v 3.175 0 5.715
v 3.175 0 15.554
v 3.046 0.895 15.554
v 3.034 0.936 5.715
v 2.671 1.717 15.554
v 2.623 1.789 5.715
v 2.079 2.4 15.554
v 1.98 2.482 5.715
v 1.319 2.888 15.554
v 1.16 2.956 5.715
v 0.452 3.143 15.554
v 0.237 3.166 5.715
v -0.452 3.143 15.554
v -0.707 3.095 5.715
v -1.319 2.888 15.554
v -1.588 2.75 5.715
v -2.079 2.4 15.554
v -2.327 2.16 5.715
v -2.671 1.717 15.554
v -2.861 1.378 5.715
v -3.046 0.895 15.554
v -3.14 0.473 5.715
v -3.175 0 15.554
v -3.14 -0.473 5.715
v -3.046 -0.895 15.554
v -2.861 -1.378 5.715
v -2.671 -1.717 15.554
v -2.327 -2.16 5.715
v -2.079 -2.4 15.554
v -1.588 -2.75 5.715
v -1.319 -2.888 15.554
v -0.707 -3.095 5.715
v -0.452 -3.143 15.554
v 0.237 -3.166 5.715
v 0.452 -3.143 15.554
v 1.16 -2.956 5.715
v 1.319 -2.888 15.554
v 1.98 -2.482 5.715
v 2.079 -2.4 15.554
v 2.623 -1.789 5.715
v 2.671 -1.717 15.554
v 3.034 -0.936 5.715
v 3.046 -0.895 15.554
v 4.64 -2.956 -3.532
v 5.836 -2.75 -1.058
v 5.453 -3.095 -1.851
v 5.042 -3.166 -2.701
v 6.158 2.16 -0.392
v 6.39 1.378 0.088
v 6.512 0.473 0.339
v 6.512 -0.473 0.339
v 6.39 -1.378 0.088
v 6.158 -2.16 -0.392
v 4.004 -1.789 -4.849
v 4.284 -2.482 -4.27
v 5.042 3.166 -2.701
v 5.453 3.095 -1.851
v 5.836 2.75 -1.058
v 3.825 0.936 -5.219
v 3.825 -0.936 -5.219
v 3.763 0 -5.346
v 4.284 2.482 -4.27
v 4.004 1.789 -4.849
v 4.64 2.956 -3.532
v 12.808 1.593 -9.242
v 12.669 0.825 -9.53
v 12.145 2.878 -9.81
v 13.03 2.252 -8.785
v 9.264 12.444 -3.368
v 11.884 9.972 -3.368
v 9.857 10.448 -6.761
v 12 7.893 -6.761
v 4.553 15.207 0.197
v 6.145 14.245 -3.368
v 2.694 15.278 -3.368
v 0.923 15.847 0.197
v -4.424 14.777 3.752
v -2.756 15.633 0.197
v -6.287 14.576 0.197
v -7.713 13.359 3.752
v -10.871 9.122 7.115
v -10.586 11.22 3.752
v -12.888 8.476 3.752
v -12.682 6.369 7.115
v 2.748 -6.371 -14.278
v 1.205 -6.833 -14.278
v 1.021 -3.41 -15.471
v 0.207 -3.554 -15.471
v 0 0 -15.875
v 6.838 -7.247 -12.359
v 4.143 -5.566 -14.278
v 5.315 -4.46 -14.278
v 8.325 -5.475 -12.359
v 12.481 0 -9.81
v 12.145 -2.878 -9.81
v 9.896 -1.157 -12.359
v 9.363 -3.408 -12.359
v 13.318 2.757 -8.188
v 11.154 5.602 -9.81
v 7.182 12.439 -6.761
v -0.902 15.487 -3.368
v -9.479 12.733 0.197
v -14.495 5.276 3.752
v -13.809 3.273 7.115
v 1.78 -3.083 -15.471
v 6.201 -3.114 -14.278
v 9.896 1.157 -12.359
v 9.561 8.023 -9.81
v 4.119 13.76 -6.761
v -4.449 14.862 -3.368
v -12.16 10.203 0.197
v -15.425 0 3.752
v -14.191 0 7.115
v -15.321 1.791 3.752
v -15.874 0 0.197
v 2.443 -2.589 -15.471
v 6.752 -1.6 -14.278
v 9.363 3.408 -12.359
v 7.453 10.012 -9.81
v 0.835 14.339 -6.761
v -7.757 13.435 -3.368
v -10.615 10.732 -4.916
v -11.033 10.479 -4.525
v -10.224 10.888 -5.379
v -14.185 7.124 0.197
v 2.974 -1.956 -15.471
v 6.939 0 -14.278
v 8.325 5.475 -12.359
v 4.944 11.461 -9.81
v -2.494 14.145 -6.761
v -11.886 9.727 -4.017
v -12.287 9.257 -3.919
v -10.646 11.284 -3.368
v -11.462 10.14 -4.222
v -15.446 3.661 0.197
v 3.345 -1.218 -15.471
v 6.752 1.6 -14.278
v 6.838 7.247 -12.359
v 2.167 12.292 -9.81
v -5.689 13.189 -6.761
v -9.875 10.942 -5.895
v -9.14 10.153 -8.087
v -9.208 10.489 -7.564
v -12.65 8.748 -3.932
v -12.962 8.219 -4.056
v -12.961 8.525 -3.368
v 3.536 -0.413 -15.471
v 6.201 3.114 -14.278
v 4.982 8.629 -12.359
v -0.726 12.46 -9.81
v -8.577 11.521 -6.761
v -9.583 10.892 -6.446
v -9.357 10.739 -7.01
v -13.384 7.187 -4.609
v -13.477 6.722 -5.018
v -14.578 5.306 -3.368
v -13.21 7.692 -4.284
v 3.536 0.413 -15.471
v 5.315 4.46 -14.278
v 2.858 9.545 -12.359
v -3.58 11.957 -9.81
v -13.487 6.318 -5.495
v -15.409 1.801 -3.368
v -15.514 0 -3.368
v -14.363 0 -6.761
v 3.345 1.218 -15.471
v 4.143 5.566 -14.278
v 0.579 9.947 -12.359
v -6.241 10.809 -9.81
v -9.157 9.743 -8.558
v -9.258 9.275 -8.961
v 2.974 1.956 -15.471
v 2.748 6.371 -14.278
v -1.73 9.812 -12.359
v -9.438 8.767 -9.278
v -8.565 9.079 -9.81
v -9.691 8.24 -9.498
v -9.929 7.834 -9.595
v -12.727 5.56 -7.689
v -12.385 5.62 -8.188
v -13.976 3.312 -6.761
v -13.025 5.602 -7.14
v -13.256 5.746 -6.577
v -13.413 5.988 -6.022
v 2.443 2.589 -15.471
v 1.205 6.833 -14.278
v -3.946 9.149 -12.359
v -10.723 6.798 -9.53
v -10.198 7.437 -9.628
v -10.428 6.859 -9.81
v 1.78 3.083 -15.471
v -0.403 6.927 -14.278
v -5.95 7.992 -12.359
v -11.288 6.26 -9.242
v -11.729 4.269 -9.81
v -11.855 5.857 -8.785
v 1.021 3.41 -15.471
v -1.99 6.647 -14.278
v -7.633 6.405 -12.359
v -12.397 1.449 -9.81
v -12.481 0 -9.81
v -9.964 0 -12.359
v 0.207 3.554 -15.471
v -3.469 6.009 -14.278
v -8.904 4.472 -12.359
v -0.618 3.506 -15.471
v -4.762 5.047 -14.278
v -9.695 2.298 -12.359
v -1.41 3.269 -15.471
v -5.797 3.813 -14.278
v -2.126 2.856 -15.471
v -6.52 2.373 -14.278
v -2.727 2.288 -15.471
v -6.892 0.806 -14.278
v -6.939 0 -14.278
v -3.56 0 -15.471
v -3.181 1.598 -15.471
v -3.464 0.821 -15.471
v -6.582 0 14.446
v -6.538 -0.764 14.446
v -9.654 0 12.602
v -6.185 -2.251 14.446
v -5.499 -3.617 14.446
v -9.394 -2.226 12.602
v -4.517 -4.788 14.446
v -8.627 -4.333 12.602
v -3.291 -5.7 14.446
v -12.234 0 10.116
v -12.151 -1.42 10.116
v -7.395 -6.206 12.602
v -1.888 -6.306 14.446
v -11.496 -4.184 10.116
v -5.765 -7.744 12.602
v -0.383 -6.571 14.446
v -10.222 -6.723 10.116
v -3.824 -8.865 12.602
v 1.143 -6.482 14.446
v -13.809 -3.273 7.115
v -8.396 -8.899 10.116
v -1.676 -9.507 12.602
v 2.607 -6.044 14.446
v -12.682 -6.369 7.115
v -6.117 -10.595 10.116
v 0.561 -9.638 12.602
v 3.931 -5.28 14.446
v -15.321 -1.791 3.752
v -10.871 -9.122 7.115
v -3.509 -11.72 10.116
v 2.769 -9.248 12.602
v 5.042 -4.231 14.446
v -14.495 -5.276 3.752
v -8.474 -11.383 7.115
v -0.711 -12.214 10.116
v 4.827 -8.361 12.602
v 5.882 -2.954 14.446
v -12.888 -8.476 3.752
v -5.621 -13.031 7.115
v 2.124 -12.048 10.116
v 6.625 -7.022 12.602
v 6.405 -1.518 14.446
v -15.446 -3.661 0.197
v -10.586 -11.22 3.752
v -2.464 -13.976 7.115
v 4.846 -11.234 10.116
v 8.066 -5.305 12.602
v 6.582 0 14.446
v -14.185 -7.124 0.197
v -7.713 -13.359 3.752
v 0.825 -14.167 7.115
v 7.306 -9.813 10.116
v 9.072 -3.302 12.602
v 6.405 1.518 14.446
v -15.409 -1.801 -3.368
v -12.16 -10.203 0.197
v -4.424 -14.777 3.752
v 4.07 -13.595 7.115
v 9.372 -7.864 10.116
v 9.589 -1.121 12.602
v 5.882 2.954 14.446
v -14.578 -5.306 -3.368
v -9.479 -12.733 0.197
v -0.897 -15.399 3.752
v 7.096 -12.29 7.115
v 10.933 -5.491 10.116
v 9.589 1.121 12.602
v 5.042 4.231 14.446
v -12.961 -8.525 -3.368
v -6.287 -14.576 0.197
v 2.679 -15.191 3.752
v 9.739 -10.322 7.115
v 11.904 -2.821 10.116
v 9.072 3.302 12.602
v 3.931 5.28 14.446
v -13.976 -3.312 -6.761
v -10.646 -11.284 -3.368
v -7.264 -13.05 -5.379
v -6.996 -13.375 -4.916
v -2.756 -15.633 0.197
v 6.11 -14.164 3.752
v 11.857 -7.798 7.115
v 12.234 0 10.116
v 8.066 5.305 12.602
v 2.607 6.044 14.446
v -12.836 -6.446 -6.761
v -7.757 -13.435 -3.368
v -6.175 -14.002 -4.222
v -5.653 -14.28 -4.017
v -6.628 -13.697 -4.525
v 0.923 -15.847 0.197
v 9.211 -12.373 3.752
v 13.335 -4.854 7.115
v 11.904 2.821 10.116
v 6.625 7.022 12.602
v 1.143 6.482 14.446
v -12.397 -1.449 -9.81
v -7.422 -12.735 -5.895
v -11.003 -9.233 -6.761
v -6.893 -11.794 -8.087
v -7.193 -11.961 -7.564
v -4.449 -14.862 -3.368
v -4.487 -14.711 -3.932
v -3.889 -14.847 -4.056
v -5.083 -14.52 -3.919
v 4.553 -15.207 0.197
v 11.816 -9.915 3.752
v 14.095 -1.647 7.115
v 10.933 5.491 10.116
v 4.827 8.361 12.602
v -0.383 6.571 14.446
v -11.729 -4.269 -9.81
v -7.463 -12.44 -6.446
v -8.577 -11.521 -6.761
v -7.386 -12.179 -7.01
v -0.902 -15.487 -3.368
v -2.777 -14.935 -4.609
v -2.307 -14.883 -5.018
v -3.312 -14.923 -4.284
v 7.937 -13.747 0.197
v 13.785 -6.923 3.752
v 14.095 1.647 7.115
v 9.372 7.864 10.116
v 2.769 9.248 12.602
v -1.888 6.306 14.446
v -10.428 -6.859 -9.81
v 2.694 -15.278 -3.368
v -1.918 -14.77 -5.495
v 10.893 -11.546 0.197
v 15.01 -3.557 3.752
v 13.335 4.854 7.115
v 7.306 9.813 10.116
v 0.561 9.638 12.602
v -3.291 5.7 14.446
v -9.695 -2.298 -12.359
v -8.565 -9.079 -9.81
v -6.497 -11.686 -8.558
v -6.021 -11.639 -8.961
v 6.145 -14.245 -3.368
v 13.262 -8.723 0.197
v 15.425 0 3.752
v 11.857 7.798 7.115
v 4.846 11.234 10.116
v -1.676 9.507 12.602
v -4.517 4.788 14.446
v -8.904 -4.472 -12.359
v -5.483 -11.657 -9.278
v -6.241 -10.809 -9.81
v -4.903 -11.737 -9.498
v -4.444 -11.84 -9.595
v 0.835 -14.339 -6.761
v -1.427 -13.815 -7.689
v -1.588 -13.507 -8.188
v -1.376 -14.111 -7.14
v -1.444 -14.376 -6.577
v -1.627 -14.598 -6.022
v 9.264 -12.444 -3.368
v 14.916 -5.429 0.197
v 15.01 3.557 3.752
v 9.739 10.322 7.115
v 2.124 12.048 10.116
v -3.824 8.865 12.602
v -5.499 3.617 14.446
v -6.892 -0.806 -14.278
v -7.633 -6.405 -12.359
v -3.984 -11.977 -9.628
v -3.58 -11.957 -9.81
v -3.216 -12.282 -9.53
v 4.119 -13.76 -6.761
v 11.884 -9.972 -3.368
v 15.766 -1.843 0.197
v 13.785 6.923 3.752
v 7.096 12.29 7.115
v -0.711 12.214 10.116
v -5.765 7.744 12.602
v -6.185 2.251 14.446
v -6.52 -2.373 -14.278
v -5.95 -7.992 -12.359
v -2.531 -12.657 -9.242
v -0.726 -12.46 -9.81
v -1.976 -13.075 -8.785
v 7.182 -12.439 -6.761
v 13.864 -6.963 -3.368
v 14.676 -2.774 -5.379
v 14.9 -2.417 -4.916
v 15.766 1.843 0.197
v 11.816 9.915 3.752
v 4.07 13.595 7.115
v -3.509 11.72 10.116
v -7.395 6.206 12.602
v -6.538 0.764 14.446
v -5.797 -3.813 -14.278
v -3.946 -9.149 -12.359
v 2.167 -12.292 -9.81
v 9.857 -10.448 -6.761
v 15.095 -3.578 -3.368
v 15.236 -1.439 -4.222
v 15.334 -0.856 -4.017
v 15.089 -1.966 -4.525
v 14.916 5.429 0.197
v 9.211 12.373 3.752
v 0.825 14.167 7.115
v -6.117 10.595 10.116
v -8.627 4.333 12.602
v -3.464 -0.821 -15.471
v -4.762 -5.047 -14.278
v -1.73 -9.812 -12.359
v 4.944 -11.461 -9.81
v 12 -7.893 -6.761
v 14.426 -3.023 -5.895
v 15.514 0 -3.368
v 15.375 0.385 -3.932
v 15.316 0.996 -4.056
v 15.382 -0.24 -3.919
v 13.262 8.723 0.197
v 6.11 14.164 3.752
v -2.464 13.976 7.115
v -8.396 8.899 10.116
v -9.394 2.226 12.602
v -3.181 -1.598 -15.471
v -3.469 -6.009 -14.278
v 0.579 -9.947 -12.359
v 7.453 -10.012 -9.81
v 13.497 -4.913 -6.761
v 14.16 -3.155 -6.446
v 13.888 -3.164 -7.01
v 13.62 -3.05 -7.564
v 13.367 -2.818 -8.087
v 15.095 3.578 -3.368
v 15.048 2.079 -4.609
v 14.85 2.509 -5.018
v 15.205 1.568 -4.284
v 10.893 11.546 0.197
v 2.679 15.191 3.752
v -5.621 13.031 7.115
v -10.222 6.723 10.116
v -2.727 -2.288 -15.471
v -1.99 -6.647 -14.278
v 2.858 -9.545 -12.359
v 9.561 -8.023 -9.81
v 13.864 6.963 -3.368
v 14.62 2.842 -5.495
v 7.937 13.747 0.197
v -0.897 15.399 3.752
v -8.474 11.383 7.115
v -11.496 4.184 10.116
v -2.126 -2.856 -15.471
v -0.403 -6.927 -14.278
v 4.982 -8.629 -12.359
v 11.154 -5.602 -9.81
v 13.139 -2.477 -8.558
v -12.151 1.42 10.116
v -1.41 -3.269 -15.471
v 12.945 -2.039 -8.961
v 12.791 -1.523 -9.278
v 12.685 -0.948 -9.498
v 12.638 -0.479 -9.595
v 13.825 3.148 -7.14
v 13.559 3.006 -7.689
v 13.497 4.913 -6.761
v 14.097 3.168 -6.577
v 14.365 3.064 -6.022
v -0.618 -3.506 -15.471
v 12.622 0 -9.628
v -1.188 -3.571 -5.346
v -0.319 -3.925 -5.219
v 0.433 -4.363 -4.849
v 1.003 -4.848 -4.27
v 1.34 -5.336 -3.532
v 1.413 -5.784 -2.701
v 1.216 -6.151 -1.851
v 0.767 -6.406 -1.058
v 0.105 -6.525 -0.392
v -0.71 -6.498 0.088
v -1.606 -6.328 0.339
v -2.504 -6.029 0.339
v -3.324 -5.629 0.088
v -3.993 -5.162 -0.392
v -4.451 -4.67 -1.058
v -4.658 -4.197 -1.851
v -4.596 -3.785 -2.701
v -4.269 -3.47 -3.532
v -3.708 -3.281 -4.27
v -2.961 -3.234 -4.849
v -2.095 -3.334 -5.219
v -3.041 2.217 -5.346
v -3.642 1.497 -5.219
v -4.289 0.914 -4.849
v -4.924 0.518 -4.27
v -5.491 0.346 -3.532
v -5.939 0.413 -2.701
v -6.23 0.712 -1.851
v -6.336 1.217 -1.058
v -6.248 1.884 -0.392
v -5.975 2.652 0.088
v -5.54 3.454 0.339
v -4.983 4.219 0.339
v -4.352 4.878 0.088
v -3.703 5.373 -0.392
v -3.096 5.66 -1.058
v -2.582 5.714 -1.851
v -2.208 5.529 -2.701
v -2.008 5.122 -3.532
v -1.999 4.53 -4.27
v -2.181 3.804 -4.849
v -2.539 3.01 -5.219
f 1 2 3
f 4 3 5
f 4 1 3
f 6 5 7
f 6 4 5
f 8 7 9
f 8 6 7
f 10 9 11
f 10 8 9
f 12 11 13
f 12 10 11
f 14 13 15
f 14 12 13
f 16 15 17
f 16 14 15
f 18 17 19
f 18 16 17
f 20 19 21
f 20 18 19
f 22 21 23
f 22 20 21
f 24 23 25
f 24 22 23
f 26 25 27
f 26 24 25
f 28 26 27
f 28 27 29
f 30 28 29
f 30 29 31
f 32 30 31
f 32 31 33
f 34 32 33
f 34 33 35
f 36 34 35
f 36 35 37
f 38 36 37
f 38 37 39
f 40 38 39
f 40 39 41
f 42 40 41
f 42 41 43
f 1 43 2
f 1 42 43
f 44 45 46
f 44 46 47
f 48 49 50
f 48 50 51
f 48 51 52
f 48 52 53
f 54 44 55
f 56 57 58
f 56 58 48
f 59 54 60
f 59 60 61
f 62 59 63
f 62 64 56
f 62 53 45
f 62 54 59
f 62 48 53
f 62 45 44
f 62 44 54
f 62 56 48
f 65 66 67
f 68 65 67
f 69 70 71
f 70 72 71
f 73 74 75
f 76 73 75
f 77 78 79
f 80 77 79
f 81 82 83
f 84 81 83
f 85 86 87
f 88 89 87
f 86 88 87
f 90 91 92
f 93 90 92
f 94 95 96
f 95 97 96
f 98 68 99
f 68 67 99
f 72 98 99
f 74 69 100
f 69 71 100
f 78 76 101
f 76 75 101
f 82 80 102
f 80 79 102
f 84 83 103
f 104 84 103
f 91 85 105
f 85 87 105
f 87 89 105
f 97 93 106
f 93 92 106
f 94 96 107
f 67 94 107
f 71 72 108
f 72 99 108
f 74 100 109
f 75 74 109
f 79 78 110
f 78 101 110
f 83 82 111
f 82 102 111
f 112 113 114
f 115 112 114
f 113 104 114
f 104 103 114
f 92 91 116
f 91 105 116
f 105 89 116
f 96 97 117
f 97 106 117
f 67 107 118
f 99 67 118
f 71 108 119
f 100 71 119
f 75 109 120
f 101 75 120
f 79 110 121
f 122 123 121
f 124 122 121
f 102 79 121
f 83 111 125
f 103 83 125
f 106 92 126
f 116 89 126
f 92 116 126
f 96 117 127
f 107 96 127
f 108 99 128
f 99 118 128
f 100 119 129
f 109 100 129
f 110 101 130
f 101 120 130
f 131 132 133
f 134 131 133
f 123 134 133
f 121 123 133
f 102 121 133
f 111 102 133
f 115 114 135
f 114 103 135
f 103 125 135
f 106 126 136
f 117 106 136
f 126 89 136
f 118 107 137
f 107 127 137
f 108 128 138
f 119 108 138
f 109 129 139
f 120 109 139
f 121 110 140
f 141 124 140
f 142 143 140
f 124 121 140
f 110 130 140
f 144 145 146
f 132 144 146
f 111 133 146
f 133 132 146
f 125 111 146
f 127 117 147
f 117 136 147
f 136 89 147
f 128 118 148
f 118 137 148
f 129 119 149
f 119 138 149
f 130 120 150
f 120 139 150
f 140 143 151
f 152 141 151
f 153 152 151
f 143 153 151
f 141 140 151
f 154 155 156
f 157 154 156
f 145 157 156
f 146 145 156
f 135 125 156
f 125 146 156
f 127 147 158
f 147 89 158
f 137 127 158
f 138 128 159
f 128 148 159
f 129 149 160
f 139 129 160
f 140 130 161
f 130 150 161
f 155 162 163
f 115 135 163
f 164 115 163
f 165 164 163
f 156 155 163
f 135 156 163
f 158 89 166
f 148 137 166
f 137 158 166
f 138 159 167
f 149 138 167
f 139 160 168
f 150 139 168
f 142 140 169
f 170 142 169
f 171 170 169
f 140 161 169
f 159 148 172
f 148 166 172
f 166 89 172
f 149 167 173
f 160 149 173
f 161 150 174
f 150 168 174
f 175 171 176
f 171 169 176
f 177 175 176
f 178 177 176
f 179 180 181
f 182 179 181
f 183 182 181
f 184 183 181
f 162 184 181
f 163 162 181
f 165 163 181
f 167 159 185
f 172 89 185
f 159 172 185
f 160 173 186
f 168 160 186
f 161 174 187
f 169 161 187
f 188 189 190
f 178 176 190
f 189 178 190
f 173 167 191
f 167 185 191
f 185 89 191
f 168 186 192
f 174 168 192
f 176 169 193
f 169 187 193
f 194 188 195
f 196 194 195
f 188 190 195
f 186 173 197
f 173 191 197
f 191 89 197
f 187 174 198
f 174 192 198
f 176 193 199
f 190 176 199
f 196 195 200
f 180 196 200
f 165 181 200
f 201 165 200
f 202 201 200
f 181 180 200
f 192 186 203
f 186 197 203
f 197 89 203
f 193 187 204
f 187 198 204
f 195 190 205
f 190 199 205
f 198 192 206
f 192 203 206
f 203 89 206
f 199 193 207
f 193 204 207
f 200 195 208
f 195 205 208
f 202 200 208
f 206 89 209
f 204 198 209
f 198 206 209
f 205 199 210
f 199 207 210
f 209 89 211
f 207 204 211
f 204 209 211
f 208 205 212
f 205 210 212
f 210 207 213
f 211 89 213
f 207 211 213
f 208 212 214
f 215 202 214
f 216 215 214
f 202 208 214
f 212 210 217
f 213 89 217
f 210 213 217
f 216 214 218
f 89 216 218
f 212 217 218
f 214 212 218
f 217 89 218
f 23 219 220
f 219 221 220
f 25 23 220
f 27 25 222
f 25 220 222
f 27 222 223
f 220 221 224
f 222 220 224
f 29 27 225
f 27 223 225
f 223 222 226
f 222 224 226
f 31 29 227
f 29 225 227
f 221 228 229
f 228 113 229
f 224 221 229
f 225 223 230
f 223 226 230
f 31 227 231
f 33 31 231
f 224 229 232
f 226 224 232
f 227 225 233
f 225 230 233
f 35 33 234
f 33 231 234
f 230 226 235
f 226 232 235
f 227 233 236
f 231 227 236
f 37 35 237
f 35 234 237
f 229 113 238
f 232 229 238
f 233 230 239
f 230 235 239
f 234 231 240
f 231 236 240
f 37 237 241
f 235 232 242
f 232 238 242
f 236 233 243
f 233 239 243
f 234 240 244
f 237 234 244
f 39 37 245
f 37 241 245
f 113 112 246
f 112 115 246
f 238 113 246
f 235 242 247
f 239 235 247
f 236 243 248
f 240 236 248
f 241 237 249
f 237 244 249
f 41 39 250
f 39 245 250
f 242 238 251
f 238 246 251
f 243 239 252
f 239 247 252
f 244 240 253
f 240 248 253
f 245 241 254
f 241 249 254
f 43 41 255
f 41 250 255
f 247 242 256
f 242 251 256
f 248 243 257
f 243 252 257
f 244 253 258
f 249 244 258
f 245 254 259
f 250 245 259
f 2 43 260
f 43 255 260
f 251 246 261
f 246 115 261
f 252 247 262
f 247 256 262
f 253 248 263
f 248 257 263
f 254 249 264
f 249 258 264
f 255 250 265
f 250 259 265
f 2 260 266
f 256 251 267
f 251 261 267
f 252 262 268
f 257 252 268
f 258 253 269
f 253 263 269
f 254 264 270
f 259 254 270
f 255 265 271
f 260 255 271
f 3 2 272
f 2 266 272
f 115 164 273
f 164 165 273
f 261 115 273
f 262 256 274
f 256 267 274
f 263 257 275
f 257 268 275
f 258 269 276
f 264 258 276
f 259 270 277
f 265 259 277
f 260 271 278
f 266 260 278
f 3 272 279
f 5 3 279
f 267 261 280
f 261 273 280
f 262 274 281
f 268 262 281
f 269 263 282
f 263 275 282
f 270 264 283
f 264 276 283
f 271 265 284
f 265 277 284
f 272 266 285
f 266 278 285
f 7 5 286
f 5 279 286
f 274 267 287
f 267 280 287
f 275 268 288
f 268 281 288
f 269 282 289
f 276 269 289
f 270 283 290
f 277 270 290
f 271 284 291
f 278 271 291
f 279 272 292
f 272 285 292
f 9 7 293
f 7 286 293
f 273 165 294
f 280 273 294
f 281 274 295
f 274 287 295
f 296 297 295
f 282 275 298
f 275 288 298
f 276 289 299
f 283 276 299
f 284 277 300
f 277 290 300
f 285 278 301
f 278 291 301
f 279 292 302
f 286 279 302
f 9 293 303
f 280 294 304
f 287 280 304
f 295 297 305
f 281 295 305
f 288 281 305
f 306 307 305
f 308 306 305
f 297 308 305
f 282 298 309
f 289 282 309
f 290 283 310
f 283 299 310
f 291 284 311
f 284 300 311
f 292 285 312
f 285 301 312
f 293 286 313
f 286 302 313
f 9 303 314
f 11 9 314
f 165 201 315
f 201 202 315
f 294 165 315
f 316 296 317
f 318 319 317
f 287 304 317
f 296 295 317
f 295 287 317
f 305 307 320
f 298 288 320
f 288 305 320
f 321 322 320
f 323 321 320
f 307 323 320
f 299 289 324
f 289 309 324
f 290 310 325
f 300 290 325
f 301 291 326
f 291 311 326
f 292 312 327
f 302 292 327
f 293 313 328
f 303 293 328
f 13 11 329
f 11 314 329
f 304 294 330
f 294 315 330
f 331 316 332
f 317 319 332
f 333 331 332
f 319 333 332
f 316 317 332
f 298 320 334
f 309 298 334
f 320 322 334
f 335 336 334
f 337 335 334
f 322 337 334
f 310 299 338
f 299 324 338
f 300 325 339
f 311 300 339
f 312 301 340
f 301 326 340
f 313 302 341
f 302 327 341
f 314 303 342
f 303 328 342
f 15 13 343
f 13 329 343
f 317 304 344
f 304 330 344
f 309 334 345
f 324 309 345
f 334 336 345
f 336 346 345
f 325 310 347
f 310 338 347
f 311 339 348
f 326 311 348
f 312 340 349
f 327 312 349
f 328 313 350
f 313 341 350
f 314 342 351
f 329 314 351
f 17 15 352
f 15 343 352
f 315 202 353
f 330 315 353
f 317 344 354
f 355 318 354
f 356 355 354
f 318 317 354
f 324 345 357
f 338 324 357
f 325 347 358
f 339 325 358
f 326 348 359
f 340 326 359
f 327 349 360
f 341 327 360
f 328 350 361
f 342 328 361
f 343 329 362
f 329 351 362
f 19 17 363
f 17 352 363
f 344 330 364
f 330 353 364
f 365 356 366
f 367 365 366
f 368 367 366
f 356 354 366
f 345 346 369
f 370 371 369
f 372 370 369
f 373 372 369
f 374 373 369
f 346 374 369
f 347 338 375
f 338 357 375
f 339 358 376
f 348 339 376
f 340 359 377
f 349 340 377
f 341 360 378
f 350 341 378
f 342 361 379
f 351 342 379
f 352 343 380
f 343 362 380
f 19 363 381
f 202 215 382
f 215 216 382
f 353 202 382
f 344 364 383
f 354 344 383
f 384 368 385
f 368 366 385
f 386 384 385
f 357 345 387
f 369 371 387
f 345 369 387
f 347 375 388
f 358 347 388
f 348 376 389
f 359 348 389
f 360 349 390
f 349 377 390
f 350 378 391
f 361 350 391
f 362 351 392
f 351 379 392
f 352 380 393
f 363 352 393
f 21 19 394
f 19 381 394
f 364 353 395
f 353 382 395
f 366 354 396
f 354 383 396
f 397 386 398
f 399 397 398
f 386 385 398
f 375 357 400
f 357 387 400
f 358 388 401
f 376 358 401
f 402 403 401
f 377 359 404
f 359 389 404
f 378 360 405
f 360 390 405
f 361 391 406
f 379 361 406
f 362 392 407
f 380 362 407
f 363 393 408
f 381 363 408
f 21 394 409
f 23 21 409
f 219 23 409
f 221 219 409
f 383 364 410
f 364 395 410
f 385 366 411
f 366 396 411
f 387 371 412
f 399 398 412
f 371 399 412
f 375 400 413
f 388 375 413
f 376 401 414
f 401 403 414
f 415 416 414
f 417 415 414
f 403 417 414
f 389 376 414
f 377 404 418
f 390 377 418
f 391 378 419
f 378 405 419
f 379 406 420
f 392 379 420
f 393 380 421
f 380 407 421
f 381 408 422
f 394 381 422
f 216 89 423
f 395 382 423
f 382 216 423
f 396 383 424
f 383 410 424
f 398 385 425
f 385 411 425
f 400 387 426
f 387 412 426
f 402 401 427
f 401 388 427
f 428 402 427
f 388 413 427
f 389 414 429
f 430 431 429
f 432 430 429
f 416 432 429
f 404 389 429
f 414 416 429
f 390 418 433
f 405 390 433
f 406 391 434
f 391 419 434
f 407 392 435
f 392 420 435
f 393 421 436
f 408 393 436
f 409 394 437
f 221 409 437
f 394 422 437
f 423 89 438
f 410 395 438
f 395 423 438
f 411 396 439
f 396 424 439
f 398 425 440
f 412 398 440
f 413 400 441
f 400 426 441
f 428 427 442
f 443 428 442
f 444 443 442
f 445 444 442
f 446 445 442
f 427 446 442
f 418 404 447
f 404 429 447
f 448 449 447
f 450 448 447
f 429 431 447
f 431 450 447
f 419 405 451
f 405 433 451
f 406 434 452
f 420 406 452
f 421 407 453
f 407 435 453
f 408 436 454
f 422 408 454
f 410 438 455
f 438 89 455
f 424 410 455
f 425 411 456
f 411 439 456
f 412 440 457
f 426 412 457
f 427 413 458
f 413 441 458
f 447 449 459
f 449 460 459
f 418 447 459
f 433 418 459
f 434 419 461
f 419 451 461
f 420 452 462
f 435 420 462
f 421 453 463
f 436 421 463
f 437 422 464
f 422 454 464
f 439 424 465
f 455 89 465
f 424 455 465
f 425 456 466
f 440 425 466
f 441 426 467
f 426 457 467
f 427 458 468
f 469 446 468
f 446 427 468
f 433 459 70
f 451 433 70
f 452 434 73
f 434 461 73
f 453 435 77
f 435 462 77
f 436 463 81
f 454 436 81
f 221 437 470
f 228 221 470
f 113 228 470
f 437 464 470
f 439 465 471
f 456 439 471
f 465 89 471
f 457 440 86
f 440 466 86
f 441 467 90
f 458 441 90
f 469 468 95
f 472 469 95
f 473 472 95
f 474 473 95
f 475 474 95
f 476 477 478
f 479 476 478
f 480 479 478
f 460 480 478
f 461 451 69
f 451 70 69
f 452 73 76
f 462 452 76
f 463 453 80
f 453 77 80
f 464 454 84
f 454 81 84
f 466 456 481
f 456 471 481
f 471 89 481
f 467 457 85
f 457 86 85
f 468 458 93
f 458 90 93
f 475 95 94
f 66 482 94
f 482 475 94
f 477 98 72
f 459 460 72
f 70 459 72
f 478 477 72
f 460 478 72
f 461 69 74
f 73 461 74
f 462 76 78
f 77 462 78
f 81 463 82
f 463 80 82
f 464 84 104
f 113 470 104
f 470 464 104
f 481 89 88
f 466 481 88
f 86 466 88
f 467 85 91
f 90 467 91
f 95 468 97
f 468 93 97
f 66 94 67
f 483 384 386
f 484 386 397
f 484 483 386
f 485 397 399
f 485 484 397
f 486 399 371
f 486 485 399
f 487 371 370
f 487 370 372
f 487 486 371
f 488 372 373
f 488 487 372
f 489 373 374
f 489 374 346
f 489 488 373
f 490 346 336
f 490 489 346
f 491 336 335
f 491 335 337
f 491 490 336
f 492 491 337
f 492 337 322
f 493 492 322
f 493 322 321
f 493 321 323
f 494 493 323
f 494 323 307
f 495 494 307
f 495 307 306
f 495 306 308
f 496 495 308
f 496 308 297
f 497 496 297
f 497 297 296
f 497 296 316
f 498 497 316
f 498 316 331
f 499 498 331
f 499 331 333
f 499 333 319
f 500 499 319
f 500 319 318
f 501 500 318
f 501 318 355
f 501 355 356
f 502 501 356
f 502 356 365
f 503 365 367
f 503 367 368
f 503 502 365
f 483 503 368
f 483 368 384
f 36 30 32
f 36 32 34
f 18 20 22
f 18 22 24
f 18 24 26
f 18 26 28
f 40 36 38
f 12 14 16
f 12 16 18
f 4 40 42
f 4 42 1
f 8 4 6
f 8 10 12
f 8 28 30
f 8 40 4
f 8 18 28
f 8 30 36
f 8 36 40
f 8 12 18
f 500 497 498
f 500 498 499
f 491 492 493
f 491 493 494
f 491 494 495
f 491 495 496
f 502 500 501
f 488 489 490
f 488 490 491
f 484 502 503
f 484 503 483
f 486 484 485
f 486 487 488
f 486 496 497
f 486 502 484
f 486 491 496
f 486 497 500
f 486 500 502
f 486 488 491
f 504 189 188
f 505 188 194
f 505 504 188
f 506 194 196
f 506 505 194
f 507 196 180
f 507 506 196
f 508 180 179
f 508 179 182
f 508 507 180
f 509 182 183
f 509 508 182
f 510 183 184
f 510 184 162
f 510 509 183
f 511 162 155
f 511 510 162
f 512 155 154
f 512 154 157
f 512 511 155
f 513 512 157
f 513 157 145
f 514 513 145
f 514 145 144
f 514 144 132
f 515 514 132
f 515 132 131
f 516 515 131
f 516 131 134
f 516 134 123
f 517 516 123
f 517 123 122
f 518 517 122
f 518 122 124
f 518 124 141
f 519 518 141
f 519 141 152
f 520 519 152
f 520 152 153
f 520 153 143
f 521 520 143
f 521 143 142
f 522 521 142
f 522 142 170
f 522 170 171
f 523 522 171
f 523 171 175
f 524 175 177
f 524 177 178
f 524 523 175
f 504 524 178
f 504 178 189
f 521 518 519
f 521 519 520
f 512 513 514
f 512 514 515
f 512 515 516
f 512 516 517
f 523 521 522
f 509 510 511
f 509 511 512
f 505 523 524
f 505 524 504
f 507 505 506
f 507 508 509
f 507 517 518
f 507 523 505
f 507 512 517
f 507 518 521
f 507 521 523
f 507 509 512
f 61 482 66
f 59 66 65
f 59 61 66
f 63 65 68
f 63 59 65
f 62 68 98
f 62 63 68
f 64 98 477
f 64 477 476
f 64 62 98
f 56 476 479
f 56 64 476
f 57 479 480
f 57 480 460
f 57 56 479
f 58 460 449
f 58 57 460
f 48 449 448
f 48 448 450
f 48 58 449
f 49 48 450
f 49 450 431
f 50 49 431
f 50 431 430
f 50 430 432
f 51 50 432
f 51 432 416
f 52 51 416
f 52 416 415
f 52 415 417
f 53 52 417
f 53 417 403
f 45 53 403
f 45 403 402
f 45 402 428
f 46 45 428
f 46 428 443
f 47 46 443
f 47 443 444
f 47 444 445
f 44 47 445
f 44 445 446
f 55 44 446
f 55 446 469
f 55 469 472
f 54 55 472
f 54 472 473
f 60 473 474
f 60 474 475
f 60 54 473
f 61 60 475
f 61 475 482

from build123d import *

# Parameters (mm, degrees)
F5_R      = 3.175
F6_DEPTH  = 50.8
F9_ANGLE  = 115.8
F10_ANGLE = 108.4
F11_ANGLE = 107.7


# Not quite as in the source:
# - a length typed as a fraction of an inch, garbled in the dataset ("3 / 203.2 mm" for 3/8 in), is restored


with BuildPart() as f2:
    # F0 (on Front) → F2 (revolve)
    with BuildSketch(Plane.XZ):
        with BuildLine():
            Line((0, -15.875), (0, 15.875))
            ThreePointArc((0, 15.875), (-15.875, 0), (0, -15.875))
        make_face()
    revolve(axis=Axis((0, 0, 0), (0, 0, 1)))


with BuildPart() as f6:
    # F5 (on offset) → F6 (new body)
    with BuildSketch(Plane.XY.offset(5.715)):
        Circle(F5_R)
    extrude(amount=F6_DEPTH)


with BuildPart() as f9_1:
    # F9: copy of F6
    add(f6.part.rotate(Axis((0, 33.8576585054, 0), (0, 1, 0)), F9_ANGLE))


with BuildPart() as f10_1:
    # F10: copy of F9_1
    add(f9_1.part.rotate(Axis((0, 0, -28.0886162072), (0, 0, -1)), F10_ANGLE))


with BuildPart() as f11_1:
    # F11: copy of F10_1
    add(f10_1.part.rotate(Axis((0, 0, -28.0886162072), (0, 0, -1)), F11_ANGLE))


with BuildPart() as f2_1:
    add(f2.part)

    # F12: cut F6, F10_1, F11_1, F9_1
    add(f6.part, mode=Mode.SUBTRACT)
    add(f10_1.part, mode=Mode.SUBTRACT)
    add(f11_1.part, mode=Mode.SUBTRACT)
    add(f9_1.part, mode=Mode.SUBTRACT)


solid = f2_1.part
